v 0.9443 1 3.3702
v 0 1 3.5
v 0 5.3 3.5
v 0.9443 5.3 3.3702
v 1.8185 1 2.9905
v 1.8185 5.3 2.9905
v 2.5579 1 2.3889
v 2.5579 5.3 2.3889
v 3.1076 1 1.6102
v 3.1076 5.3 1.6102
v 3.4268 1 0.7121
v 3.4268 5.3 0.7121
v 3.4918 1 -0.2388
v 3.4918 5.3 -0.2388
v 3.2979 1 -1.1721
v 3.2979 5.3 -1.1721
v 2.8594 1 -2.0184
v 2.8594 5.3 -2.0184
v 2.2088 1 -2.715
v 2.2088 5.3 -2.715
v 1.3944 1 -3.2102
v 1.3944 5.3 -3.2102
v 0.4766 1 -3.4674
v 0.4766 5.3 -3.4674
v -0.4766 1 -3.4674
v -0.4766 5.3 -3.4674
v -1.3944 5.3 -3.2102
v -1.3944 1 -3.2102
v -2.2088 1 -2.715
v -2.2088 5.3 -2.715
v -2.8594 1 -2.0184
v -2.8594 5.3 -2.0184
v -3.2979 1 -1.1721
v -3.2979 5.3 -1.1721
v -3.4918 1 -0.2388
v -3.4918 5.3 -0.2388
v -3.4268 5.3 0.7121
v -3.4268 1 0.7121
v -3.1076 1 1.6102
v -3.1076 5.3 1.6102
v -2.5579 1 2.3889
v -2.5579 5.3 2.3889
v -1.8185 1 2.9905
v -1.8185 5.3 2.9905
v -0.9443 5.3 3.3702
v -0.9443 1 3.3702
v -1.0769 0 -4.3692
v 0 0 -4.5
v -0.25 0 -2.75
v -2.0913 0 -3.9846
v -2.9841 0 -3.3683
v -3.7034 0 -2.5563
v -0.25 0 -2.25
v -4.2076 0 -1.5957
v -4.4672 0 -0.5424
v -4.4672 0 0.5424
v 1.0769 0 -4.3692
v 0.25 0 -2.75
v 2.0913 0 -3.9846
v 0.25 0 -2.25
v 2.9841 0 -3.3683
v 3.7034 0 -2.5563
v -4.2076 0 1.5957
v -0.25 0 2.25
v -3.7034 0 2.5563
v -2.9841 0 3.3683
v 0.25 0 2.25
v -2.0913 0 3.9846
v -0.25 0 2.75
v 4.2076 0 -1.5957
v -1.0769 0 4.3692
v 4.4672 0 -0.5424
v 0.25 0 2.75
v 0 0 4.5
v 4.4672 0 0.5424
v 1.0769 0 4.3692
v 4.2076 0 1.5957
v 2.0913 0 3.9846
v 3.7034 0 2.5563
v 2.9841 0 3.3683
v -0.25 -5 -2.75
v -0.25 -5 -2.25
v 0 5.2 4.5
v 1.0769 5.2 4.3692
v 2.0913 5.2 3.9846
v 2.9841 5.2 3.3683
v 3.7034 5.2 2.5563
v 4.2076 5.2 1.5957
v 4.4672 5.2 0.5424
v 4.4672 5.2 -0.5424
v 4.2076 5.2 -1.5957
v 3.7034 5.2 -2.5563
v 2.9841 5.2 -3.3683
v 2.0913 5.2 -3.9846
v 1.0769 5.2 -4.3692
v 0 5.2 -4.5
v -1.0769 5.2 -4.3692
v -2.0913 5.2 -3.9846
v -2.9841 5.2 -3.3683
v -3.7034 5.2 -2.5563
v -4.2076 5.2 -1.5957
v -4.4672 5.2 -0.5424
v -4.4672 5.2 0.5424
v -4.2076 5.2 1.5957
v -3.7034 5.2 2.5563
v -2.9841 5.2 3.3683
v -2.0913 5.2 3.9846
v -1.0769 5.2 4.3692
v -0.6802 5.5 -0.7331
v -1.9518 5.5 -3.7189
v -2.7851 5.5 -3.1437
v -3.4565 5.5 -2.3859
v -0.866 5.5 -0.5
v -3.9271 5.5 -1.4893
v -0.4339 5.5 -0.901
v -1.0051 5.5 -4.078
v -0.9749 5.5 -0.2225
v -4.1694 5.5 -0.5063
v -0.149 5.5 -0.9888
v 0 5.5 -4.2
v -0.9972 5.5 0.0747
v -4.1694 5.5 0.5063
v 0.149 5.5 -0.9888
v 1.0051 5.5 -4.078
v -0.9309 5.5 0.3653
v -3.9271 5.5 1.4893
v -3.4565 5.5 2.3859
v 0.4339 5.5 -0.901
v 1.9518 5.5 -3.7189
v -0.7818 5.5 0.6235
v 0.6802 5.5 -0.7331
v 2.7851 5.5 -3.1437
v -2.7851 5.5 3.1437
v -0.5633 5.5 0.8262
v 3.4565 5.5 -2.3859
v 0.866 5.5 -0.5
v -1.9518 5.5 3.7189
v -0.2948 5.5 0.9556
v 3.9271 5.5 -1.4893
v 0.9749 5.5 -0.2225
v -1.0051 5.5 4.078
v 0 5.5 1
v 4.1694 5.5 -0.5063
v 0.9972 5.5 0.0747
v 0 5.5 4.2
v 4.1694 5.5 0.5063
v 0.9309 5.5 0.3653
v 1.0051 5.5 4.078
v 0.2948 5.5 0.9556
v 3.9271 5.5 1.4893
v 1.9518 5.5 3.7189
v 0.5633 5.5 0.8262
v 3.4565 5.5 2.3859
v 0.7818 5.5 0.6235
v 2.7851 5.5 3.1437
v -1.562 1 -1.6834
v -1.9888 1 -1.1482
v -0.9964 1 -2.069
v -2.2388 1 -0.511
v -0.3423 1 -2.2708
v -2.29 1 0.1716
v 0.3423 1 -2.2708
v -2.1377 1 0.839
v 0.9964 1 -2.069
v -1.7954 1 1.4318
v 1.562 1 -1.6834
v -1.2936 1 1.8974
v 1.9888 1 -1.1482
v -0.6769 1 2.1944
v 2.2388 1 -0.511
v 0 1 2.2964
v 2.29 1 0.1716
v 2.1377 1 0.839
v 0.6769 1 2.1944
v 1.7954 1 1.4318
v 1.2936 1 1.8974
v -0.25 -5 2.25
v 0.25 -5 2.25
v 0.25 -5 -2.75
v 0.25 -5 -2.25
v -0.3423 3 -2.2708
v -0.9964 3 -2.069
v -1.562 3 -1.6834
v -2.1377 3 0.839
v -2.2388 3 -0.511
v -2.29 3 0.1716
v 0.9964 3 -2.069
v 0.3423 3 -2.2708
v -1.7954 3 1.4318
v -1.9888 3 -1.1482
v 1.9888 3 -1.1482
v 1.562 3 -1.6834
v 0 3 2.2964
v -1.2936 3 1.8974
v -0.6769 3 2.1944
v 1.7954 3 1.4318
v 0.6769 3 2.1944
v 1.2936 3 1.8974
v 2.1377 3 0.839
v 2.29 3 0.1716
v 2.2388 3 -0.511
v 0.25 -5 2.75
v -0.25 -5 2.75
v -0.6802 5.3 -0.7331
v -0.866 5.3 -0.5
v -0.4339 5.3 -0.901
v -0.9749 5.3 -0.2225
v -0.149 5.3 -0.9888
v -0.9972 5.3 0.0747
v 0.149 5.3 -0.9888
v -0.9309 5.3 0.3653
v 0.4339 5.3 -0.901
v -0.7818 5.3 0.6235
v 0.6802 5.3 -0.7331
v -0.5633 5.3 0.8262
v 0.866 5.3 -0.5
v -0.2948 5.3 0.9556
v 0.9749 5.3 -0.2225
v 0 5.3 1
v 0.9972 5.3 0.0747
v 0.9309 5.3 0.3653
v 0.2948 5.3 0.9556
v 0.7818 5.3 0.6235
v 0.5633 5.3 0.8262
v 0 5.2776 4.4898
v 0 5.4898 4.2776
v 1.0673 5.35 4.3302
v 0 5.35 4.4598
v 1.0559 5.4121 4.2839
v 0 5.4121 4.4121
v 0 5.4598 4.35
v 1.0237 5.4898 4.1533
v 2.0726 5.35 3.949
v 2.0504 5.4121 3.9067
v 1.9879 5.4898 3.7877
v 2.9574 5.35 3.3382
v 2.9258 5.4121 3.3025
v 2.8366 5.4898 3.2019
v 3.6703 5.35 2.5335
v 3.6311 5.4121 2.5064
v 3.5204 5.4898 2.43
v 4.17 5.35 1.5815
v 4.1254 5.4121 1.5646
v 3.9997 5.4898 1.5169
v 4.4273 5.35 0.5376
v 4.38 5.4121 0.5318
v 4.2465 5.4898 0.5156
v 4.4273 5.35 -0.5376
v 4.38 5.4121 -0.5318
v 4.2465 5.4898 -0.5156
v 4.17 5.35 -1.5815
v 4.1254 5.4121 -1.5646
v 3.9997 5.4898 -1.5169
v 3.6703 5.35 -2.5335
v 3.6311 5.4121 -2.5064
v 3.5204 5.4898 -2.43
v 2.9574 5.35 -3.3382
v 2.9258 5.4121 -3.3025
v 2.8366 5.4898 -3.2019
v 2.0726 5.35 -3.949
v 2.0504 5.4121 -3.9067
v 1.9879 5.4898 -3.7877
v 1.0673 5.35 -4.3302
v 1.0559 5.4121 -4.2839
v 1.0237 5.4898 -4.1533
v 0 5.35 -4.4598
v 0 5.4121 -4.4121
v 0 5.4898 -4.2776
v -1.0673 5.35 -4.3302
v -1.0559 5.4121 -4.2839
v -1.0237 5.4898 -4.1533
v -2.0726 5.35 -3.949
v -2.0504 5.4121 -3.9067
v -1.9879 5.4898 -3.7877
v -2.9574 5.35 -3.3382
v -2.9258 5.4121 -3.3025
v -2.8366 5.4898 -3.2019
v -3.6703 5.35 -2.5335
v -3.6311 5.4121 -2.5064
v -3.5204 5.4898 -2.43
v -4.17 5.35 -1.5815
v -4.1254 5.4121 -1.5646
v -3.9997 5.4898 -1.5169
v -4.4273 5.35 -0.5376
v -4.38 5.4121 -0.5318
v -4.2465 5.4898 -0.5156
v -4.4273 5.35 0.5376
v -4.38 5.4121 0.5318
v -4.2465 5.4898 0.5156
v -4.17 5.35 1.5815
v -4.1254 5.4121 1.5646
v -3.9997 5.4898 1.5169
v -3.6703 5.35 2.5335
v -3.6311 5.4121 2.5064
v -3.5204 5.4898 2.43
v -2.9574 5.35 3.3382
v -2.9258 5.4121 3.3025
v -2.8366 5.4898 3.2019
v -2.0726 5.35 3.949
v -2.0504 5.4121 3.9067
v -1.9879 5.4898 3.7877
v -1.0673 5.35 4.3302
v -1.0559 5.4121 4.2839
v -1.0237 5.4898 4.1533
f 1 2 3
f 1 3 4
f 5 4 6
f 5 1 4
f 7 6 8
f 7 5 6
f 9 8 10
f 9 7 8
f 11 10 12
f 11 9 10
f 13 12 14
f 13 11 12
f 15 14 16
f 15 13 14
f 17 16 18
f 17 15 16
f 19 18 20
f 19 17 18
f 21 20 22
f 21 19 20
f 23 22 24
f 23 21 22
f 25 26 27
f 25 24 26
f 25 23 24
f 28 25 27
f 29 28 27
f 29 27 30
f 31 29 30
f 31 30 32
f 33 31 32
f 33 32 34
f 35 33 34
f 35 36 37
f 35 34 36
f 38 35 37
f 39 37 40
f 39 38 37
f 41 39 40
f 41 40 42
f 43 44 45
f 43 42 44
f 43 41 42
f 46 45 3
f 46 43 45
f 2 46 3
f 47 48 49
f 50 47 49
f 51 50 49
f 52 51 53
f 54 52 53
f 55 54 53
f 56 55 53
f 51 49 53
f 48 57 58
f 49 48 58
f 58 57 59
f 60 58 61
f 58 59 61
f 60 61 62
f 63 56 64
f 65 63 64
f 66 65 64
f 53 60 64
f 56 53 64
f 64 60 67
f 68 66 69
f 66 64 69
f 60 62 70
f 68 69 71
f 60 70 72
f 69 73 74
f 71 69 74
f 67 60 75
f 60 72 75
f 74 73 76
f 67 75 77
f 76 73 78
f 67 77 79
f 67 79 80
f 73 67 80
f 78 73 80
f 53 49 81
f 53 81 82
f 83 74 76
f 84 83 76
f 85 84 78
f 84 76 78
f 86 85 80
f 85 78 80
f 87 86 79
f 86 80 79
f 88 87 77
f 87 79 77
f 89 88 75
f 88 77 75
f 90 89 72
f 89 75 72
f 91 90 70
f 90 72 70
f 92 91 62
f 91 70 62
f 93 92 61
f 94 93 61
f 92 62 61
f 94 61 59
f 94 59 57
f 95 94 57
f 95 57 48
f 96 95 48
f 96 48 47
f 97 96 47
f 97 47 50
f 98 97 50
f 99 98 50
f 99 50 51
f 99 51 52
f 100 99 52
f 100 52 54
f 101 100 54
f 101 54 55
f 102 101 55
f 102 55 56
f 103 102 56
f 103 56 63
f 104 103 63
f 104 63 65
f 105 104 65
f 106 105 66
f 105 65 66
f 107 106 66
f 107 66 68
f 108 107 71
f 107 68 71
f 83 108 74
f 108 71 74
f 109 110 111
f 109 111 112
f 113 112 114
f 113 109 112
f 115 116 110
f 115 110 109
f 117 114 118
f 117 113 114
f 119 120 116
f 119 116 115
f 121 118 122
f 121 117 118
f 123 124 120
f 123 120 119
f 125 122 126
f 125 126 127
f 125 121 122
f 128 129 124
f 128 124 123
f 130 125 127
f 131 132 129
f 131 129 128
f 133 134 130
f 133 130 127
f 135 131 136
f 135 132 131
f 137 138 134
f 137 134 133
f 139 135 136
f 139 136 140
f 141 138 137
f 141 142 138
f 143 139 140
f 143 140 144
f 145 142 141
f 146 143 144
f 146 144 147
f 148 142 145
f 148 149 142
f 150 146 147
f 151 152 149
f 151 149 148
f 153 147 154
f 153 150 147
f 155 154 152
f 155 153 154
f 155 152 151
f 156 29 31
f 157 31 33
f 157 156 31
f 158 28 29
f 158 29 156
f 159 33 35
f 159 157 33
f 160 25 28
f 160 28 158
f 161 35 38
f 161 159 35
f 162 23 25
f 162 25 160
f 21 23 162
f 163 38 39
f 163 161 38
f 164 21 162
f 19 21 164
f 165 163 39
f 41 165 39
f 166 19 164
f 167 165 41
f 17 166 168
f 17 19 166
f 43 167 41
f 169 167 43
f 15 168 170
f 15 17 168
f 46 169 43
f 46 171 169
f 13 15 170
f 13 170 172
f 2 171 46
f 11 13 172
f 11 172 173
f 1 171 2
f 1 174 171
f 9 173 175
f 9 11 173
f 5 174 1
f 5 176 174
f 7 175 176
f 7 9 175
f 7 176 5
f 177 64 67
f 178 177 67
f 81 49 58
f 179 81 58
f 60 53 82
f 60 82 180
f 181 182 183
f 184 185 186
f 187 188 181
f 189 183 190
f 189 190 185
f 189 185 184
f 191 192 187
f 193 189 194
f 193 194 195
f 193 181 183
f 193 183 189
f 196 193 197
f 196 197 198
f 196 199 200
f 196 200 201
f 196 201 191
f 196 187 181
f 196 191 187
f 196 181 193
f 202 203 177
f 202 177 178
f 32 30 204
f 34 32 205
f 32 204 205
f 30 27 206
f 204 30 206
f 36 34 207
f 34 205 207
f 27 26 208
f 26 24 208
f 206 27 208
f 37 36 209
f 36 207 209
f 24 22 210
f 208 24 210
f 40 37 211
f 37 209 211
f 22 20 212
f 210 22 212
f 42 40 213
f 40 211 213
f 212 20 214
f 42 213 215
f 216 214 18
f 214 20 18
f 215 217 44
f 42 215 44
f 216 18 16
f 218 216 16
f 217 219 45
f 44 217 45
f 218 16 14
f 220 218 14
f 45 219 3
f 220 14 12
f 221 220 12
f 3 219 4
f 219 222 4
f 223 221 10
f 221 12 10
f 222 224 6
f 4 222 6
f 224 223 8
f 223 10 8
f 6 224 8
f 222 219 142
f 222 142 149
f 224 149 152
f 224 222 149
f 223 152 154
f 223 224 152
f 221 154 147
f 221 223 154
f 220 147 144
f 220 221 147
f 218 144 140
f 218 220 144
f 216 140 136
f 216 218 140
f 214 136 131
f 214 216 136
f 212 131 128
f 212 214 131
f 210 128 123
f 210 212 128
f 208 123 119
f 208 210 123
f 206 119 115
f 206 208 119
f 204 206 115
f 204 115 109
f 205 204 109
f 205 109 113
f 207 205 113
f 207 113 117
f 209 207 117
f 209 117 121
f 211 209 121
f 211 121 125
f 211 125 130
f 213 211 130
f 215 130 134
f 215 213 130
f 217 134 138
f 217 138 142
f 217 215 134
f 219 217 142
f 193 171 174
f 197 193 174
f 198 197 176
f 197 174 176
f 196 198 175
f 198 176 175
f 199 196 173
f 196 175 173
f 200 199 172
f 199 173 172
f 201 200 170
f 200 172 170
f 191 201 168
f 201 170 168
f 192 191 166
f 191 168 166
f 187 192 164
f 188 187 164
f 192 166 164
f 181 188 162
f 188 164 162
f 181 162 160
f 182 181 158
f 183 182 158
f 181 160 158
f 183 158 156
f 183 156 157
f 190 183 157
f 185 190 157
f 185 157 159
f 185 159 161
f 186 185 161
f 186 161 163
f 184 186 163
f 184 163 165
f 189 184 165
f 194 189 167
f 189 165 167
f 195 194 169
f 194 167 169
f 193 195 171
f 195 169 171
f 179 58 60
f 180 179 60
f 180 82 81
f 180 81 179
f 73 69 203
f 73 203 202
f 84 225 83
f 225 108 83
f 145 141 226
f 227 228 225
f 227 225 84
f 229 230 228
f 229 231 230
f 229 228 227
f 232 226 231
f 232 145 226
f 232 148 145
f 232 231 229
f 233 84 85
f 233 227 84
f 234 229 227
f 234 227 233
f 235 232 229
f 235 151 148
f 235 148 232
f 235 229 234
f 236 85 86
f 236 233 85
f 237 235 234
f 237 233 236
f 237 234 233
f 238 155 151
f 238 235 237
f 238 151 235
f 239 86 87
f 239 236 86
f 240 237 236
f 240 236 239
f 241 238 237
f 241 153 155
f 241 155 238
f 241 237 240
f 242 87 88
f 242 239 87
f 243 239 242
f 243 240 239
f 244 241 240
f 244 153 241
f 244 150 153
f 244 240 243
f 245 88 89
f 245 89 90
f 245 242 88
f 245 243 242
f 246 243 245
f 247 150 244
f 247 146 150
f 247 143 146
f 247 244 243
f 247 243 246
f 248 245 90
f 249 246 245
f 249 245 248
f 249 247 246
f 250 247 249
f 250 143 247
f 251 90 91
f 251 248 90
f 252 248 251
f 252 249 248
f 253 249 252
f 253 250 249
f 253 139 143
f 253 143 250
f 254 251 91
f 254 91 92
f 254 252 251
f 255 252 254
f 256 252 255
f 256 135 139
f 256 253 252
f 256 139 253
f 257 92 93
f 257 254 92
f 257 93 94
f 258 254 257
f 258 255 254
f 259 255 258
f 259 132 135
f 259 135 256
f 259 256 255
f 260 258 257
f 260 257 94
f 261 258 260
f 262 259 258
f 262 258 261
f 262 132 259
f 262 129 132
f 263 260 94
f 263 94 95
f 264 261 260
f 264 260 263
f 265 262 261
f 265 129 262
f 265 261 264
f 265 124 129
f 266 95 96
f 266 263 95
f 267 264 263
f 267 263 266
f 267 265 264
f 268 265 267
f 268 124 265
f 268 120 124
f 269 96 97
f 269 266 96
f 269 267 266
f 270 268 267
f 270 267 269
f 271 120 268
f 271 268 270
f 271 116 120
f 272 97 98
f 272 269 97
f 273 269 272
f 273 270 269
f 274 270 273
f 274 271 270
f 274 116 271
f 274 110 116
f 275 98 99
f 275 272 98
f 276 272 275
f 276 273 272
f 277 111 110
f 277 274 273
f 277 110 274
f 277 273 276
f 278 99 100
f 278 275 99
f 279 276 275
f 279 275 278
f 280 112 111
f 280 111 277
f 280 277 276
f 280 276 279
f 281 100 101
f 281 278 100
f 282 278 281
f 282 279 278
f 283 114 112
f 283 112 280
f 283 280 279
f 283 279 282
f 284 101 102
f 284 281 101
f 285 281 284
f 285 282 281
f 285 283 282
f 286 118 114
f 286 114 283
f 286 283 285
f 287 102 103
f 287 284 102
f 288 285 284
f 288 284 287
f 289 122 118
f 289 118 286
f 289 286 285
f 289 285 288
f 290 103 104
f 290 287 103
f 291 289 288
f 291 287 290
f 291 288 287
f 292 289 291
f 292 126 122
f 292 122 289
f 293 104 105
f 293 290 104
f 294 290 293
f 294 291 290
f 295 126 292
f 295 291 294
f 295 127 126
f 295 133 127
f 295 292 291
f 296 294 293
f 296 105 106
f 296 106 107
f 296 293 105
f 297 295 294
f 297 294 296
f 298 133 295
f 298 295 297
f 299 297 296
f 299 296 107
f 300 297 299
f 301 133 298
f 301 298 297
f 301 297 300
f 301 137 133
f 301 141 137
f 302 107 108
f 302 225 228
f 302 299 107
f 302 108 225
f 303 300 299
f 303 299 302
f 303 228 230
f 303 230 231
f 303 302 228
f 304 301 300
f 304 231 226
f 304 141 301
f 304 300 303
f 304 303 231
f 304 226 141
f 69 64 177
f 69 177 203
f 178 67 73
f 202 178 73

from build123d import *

# Parameters (mm, degrees)
CROQUIS1_R              = 4.5
SALIENTE_EXTRUIR1_DEPTH = 1
CROQUIS2_R              = 4.5
CROQUIS2_R_2            = 3.5
SALIENTE_EXTRUIR2_DEPTH = 4.5
CROQUIS3_R              = 2.296416316
SALIENTE_EXTRUIR3_DEPTH = 2
SALIENTE_EXTRUIR4_START = -0.2
CROQUIS4_R              = 4.5
CROQUIS4_R_2            = 1
SALIENTE_EXTRUIR4_DEPTH = 0.2
CROQUIS5_W              = 0.5
CROQUIS5_H              = 0.5
SALIENTE_EXTRUIR5_DEPTH = 5
REDONDEO1_R             = 0.3


with BuildPart() as part:
    # Croquis1 → Saliente-Extruir1 (new body)
    with BuildSketch(Plane(origin=(0, 0, 0), x_dir=(1, 0, 0), z_dir=(0, 1, 0))):
        with Locations(Location((0, 0, 0), (0, 0, 270))):
            Circle(CROQUIS1_R)
    extrude(amount=SALIENTE_EXTRUIR1_DEPTH)

    # Croquis2 → Saliente-Extruir2 (add)
    with BuildSketch(Plane(origin=(0, 1, 0), x_dir=(1, 0, 0), z_dir=(0, 1, 0))):
        with Locations(Location((0, 0, 0), (0, 0, 270))):
            Circle(CROQUIS2_R)
        with Locations(Location((0, 0, 0), (0, 0, 270))):
            Circle(CROQUIS2_R_2, mode=Mode.SUBTRACT)
    extrude(amount=SALIENTE_EXTRUIR2_DEPTH)

    # Croquis3 → Saliente-Extruir3 (add)
    with BuildSketch(Plane(origin=(0, 1, 0), x_dir=(1, 0, 0), z_dir=(0, 1, 0))):
        with Locations(Location((0, 0, 0), (0, 0, 270))):
            Circle(CROQUIS3_R)
    extrude(amount=SALIENTE_EXTRUIR3_DEPTH)

    # Croquis4 → Saliente-Extruir4 (add)
    with BuildSketch(Plane(origin=(0, 5.5, 0), x_dir=(1, 0, 0), z_dir=(0, 1, 0)).offset(SALIENTE_EXTRUIR4_START)):
        with Locations(Location((0, 0, 0), (0, 0, 270))):
            Circle(CROQUIS4_R)
        with Locations(Location((0, 0, 0), (0, 0, 270))):
            Circle(CROQUIS4_R_2, mode=Mode.SUBTRACT)
    extrude(amount=SALIENTE_EXTRUIR4_DEPTH)

    # Croquis5 → Saliente-Extruir5 (add)
    with BuildSketch(Plane.XZ):
        with Locations((0, -2.5)):
            Rectangle(CROQUIS5_W, CROQUIS5_H)
        with Locations((0, 2.5)):
            Rectangle(CROQUIS5_W, CROQUIS5_H)
    extrude(amount=SALIENTE_EXTRUIR5_DEPTH)

    # Redondeo1
    redondeo1_edges = [part.edges().sort_by_distance(p)[0] for p in [
        (0, 5.5, -4.5),
    ]]
    fillet(redondeo1_edges, radius=REDONDEO1_R)


solid = part.part
